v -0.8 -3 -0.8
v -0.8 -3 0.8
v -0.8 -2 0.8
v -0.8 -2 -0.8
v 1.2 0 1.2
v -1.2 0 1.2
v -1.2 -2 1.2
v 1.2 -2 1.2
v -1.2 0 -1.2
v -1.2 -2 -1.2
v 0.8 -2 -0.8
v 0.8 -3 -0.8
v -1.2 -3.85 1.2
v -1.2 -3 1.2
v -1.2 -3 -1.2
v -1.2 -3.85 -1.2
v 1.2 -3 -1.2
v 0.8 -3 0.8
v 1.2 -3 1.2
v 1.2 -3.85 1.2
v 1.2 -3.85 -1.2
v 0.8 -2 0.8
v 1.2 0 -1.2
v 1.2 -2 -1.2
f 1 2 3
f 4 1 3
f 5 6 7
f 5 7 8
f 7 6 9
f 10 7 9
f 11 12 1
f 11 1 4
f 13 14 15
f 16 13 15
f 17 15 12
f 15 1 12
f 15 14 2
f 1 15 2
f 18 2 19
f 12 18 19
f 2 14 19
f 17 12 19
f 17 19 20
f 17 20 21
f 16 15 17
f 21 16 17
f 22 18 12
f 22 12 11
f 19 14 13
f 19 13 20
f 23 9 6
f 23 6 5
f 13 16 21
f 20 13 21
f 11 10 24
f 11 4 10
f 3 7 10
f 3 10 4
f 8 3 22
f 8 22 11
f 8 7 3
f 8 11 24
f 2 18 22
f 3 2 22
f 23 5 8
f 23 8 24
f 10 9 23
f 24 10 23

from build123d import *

# Parameters (mm, degrees)
SKETCH3_W           = 2.4
SKETCH3_H           = 2.4
BOSS_EXTRUDE3_DEPTH = 3.85
SKETCH8_W           = 0.4
SKETCH8_H           = 1
CUT_EXTRUDE1_DEPTH  = 2.4
SKETCH10_W          = 0.4
SKETCH10_H          = 1
CUT_EXTRUDE2_DEPTH  = 2.4


with BuildPart() as part:
    # Sketch3 → Boss-Extrude3 (new body)
    with BuildSketch(Plane(origin=(0, 0, 0), x_dir=(1, 0, 0), z_dir=(0, 1, 0))):
        Rectangle(SKETCH3_W, SKETCH3_H)
    extrude(amount=-BOSS_EXTRUDE3_DEPTH)

    # Sketch8 → Cut-Extrude1 (cut)
    with BuildSketch(Plane.XY.offset(1.2)):
        with Locations((-1, -2.5)):
            Rectangle(SKETCH8_W, SKETCH8_H)
        with Locations((1, -2.5)):
            Rectangle(SKETCH8_W, SKETCH8_H)
    extrude(amount=-CUT_EXTRUDE1_DEPTH, mode=Mode.SUBTRACT)

    # Sketch10 → Cut-Extrude2 (cut)
    with BuildSketch(Plane.ZY.offset(-1.2)):
        with Locations((-1, -2.5)):
            Rectangle(SKETCH10_W, SKETCH10_H)
        with Locations((1, -2.5)):
            Rectangle(SKETCH10_W, SKETCH10_H)
    extrude(amount=CUT_EXTRUDE2_DEPTH, mode=Mode.SUBTRACT)


solid = part.part
